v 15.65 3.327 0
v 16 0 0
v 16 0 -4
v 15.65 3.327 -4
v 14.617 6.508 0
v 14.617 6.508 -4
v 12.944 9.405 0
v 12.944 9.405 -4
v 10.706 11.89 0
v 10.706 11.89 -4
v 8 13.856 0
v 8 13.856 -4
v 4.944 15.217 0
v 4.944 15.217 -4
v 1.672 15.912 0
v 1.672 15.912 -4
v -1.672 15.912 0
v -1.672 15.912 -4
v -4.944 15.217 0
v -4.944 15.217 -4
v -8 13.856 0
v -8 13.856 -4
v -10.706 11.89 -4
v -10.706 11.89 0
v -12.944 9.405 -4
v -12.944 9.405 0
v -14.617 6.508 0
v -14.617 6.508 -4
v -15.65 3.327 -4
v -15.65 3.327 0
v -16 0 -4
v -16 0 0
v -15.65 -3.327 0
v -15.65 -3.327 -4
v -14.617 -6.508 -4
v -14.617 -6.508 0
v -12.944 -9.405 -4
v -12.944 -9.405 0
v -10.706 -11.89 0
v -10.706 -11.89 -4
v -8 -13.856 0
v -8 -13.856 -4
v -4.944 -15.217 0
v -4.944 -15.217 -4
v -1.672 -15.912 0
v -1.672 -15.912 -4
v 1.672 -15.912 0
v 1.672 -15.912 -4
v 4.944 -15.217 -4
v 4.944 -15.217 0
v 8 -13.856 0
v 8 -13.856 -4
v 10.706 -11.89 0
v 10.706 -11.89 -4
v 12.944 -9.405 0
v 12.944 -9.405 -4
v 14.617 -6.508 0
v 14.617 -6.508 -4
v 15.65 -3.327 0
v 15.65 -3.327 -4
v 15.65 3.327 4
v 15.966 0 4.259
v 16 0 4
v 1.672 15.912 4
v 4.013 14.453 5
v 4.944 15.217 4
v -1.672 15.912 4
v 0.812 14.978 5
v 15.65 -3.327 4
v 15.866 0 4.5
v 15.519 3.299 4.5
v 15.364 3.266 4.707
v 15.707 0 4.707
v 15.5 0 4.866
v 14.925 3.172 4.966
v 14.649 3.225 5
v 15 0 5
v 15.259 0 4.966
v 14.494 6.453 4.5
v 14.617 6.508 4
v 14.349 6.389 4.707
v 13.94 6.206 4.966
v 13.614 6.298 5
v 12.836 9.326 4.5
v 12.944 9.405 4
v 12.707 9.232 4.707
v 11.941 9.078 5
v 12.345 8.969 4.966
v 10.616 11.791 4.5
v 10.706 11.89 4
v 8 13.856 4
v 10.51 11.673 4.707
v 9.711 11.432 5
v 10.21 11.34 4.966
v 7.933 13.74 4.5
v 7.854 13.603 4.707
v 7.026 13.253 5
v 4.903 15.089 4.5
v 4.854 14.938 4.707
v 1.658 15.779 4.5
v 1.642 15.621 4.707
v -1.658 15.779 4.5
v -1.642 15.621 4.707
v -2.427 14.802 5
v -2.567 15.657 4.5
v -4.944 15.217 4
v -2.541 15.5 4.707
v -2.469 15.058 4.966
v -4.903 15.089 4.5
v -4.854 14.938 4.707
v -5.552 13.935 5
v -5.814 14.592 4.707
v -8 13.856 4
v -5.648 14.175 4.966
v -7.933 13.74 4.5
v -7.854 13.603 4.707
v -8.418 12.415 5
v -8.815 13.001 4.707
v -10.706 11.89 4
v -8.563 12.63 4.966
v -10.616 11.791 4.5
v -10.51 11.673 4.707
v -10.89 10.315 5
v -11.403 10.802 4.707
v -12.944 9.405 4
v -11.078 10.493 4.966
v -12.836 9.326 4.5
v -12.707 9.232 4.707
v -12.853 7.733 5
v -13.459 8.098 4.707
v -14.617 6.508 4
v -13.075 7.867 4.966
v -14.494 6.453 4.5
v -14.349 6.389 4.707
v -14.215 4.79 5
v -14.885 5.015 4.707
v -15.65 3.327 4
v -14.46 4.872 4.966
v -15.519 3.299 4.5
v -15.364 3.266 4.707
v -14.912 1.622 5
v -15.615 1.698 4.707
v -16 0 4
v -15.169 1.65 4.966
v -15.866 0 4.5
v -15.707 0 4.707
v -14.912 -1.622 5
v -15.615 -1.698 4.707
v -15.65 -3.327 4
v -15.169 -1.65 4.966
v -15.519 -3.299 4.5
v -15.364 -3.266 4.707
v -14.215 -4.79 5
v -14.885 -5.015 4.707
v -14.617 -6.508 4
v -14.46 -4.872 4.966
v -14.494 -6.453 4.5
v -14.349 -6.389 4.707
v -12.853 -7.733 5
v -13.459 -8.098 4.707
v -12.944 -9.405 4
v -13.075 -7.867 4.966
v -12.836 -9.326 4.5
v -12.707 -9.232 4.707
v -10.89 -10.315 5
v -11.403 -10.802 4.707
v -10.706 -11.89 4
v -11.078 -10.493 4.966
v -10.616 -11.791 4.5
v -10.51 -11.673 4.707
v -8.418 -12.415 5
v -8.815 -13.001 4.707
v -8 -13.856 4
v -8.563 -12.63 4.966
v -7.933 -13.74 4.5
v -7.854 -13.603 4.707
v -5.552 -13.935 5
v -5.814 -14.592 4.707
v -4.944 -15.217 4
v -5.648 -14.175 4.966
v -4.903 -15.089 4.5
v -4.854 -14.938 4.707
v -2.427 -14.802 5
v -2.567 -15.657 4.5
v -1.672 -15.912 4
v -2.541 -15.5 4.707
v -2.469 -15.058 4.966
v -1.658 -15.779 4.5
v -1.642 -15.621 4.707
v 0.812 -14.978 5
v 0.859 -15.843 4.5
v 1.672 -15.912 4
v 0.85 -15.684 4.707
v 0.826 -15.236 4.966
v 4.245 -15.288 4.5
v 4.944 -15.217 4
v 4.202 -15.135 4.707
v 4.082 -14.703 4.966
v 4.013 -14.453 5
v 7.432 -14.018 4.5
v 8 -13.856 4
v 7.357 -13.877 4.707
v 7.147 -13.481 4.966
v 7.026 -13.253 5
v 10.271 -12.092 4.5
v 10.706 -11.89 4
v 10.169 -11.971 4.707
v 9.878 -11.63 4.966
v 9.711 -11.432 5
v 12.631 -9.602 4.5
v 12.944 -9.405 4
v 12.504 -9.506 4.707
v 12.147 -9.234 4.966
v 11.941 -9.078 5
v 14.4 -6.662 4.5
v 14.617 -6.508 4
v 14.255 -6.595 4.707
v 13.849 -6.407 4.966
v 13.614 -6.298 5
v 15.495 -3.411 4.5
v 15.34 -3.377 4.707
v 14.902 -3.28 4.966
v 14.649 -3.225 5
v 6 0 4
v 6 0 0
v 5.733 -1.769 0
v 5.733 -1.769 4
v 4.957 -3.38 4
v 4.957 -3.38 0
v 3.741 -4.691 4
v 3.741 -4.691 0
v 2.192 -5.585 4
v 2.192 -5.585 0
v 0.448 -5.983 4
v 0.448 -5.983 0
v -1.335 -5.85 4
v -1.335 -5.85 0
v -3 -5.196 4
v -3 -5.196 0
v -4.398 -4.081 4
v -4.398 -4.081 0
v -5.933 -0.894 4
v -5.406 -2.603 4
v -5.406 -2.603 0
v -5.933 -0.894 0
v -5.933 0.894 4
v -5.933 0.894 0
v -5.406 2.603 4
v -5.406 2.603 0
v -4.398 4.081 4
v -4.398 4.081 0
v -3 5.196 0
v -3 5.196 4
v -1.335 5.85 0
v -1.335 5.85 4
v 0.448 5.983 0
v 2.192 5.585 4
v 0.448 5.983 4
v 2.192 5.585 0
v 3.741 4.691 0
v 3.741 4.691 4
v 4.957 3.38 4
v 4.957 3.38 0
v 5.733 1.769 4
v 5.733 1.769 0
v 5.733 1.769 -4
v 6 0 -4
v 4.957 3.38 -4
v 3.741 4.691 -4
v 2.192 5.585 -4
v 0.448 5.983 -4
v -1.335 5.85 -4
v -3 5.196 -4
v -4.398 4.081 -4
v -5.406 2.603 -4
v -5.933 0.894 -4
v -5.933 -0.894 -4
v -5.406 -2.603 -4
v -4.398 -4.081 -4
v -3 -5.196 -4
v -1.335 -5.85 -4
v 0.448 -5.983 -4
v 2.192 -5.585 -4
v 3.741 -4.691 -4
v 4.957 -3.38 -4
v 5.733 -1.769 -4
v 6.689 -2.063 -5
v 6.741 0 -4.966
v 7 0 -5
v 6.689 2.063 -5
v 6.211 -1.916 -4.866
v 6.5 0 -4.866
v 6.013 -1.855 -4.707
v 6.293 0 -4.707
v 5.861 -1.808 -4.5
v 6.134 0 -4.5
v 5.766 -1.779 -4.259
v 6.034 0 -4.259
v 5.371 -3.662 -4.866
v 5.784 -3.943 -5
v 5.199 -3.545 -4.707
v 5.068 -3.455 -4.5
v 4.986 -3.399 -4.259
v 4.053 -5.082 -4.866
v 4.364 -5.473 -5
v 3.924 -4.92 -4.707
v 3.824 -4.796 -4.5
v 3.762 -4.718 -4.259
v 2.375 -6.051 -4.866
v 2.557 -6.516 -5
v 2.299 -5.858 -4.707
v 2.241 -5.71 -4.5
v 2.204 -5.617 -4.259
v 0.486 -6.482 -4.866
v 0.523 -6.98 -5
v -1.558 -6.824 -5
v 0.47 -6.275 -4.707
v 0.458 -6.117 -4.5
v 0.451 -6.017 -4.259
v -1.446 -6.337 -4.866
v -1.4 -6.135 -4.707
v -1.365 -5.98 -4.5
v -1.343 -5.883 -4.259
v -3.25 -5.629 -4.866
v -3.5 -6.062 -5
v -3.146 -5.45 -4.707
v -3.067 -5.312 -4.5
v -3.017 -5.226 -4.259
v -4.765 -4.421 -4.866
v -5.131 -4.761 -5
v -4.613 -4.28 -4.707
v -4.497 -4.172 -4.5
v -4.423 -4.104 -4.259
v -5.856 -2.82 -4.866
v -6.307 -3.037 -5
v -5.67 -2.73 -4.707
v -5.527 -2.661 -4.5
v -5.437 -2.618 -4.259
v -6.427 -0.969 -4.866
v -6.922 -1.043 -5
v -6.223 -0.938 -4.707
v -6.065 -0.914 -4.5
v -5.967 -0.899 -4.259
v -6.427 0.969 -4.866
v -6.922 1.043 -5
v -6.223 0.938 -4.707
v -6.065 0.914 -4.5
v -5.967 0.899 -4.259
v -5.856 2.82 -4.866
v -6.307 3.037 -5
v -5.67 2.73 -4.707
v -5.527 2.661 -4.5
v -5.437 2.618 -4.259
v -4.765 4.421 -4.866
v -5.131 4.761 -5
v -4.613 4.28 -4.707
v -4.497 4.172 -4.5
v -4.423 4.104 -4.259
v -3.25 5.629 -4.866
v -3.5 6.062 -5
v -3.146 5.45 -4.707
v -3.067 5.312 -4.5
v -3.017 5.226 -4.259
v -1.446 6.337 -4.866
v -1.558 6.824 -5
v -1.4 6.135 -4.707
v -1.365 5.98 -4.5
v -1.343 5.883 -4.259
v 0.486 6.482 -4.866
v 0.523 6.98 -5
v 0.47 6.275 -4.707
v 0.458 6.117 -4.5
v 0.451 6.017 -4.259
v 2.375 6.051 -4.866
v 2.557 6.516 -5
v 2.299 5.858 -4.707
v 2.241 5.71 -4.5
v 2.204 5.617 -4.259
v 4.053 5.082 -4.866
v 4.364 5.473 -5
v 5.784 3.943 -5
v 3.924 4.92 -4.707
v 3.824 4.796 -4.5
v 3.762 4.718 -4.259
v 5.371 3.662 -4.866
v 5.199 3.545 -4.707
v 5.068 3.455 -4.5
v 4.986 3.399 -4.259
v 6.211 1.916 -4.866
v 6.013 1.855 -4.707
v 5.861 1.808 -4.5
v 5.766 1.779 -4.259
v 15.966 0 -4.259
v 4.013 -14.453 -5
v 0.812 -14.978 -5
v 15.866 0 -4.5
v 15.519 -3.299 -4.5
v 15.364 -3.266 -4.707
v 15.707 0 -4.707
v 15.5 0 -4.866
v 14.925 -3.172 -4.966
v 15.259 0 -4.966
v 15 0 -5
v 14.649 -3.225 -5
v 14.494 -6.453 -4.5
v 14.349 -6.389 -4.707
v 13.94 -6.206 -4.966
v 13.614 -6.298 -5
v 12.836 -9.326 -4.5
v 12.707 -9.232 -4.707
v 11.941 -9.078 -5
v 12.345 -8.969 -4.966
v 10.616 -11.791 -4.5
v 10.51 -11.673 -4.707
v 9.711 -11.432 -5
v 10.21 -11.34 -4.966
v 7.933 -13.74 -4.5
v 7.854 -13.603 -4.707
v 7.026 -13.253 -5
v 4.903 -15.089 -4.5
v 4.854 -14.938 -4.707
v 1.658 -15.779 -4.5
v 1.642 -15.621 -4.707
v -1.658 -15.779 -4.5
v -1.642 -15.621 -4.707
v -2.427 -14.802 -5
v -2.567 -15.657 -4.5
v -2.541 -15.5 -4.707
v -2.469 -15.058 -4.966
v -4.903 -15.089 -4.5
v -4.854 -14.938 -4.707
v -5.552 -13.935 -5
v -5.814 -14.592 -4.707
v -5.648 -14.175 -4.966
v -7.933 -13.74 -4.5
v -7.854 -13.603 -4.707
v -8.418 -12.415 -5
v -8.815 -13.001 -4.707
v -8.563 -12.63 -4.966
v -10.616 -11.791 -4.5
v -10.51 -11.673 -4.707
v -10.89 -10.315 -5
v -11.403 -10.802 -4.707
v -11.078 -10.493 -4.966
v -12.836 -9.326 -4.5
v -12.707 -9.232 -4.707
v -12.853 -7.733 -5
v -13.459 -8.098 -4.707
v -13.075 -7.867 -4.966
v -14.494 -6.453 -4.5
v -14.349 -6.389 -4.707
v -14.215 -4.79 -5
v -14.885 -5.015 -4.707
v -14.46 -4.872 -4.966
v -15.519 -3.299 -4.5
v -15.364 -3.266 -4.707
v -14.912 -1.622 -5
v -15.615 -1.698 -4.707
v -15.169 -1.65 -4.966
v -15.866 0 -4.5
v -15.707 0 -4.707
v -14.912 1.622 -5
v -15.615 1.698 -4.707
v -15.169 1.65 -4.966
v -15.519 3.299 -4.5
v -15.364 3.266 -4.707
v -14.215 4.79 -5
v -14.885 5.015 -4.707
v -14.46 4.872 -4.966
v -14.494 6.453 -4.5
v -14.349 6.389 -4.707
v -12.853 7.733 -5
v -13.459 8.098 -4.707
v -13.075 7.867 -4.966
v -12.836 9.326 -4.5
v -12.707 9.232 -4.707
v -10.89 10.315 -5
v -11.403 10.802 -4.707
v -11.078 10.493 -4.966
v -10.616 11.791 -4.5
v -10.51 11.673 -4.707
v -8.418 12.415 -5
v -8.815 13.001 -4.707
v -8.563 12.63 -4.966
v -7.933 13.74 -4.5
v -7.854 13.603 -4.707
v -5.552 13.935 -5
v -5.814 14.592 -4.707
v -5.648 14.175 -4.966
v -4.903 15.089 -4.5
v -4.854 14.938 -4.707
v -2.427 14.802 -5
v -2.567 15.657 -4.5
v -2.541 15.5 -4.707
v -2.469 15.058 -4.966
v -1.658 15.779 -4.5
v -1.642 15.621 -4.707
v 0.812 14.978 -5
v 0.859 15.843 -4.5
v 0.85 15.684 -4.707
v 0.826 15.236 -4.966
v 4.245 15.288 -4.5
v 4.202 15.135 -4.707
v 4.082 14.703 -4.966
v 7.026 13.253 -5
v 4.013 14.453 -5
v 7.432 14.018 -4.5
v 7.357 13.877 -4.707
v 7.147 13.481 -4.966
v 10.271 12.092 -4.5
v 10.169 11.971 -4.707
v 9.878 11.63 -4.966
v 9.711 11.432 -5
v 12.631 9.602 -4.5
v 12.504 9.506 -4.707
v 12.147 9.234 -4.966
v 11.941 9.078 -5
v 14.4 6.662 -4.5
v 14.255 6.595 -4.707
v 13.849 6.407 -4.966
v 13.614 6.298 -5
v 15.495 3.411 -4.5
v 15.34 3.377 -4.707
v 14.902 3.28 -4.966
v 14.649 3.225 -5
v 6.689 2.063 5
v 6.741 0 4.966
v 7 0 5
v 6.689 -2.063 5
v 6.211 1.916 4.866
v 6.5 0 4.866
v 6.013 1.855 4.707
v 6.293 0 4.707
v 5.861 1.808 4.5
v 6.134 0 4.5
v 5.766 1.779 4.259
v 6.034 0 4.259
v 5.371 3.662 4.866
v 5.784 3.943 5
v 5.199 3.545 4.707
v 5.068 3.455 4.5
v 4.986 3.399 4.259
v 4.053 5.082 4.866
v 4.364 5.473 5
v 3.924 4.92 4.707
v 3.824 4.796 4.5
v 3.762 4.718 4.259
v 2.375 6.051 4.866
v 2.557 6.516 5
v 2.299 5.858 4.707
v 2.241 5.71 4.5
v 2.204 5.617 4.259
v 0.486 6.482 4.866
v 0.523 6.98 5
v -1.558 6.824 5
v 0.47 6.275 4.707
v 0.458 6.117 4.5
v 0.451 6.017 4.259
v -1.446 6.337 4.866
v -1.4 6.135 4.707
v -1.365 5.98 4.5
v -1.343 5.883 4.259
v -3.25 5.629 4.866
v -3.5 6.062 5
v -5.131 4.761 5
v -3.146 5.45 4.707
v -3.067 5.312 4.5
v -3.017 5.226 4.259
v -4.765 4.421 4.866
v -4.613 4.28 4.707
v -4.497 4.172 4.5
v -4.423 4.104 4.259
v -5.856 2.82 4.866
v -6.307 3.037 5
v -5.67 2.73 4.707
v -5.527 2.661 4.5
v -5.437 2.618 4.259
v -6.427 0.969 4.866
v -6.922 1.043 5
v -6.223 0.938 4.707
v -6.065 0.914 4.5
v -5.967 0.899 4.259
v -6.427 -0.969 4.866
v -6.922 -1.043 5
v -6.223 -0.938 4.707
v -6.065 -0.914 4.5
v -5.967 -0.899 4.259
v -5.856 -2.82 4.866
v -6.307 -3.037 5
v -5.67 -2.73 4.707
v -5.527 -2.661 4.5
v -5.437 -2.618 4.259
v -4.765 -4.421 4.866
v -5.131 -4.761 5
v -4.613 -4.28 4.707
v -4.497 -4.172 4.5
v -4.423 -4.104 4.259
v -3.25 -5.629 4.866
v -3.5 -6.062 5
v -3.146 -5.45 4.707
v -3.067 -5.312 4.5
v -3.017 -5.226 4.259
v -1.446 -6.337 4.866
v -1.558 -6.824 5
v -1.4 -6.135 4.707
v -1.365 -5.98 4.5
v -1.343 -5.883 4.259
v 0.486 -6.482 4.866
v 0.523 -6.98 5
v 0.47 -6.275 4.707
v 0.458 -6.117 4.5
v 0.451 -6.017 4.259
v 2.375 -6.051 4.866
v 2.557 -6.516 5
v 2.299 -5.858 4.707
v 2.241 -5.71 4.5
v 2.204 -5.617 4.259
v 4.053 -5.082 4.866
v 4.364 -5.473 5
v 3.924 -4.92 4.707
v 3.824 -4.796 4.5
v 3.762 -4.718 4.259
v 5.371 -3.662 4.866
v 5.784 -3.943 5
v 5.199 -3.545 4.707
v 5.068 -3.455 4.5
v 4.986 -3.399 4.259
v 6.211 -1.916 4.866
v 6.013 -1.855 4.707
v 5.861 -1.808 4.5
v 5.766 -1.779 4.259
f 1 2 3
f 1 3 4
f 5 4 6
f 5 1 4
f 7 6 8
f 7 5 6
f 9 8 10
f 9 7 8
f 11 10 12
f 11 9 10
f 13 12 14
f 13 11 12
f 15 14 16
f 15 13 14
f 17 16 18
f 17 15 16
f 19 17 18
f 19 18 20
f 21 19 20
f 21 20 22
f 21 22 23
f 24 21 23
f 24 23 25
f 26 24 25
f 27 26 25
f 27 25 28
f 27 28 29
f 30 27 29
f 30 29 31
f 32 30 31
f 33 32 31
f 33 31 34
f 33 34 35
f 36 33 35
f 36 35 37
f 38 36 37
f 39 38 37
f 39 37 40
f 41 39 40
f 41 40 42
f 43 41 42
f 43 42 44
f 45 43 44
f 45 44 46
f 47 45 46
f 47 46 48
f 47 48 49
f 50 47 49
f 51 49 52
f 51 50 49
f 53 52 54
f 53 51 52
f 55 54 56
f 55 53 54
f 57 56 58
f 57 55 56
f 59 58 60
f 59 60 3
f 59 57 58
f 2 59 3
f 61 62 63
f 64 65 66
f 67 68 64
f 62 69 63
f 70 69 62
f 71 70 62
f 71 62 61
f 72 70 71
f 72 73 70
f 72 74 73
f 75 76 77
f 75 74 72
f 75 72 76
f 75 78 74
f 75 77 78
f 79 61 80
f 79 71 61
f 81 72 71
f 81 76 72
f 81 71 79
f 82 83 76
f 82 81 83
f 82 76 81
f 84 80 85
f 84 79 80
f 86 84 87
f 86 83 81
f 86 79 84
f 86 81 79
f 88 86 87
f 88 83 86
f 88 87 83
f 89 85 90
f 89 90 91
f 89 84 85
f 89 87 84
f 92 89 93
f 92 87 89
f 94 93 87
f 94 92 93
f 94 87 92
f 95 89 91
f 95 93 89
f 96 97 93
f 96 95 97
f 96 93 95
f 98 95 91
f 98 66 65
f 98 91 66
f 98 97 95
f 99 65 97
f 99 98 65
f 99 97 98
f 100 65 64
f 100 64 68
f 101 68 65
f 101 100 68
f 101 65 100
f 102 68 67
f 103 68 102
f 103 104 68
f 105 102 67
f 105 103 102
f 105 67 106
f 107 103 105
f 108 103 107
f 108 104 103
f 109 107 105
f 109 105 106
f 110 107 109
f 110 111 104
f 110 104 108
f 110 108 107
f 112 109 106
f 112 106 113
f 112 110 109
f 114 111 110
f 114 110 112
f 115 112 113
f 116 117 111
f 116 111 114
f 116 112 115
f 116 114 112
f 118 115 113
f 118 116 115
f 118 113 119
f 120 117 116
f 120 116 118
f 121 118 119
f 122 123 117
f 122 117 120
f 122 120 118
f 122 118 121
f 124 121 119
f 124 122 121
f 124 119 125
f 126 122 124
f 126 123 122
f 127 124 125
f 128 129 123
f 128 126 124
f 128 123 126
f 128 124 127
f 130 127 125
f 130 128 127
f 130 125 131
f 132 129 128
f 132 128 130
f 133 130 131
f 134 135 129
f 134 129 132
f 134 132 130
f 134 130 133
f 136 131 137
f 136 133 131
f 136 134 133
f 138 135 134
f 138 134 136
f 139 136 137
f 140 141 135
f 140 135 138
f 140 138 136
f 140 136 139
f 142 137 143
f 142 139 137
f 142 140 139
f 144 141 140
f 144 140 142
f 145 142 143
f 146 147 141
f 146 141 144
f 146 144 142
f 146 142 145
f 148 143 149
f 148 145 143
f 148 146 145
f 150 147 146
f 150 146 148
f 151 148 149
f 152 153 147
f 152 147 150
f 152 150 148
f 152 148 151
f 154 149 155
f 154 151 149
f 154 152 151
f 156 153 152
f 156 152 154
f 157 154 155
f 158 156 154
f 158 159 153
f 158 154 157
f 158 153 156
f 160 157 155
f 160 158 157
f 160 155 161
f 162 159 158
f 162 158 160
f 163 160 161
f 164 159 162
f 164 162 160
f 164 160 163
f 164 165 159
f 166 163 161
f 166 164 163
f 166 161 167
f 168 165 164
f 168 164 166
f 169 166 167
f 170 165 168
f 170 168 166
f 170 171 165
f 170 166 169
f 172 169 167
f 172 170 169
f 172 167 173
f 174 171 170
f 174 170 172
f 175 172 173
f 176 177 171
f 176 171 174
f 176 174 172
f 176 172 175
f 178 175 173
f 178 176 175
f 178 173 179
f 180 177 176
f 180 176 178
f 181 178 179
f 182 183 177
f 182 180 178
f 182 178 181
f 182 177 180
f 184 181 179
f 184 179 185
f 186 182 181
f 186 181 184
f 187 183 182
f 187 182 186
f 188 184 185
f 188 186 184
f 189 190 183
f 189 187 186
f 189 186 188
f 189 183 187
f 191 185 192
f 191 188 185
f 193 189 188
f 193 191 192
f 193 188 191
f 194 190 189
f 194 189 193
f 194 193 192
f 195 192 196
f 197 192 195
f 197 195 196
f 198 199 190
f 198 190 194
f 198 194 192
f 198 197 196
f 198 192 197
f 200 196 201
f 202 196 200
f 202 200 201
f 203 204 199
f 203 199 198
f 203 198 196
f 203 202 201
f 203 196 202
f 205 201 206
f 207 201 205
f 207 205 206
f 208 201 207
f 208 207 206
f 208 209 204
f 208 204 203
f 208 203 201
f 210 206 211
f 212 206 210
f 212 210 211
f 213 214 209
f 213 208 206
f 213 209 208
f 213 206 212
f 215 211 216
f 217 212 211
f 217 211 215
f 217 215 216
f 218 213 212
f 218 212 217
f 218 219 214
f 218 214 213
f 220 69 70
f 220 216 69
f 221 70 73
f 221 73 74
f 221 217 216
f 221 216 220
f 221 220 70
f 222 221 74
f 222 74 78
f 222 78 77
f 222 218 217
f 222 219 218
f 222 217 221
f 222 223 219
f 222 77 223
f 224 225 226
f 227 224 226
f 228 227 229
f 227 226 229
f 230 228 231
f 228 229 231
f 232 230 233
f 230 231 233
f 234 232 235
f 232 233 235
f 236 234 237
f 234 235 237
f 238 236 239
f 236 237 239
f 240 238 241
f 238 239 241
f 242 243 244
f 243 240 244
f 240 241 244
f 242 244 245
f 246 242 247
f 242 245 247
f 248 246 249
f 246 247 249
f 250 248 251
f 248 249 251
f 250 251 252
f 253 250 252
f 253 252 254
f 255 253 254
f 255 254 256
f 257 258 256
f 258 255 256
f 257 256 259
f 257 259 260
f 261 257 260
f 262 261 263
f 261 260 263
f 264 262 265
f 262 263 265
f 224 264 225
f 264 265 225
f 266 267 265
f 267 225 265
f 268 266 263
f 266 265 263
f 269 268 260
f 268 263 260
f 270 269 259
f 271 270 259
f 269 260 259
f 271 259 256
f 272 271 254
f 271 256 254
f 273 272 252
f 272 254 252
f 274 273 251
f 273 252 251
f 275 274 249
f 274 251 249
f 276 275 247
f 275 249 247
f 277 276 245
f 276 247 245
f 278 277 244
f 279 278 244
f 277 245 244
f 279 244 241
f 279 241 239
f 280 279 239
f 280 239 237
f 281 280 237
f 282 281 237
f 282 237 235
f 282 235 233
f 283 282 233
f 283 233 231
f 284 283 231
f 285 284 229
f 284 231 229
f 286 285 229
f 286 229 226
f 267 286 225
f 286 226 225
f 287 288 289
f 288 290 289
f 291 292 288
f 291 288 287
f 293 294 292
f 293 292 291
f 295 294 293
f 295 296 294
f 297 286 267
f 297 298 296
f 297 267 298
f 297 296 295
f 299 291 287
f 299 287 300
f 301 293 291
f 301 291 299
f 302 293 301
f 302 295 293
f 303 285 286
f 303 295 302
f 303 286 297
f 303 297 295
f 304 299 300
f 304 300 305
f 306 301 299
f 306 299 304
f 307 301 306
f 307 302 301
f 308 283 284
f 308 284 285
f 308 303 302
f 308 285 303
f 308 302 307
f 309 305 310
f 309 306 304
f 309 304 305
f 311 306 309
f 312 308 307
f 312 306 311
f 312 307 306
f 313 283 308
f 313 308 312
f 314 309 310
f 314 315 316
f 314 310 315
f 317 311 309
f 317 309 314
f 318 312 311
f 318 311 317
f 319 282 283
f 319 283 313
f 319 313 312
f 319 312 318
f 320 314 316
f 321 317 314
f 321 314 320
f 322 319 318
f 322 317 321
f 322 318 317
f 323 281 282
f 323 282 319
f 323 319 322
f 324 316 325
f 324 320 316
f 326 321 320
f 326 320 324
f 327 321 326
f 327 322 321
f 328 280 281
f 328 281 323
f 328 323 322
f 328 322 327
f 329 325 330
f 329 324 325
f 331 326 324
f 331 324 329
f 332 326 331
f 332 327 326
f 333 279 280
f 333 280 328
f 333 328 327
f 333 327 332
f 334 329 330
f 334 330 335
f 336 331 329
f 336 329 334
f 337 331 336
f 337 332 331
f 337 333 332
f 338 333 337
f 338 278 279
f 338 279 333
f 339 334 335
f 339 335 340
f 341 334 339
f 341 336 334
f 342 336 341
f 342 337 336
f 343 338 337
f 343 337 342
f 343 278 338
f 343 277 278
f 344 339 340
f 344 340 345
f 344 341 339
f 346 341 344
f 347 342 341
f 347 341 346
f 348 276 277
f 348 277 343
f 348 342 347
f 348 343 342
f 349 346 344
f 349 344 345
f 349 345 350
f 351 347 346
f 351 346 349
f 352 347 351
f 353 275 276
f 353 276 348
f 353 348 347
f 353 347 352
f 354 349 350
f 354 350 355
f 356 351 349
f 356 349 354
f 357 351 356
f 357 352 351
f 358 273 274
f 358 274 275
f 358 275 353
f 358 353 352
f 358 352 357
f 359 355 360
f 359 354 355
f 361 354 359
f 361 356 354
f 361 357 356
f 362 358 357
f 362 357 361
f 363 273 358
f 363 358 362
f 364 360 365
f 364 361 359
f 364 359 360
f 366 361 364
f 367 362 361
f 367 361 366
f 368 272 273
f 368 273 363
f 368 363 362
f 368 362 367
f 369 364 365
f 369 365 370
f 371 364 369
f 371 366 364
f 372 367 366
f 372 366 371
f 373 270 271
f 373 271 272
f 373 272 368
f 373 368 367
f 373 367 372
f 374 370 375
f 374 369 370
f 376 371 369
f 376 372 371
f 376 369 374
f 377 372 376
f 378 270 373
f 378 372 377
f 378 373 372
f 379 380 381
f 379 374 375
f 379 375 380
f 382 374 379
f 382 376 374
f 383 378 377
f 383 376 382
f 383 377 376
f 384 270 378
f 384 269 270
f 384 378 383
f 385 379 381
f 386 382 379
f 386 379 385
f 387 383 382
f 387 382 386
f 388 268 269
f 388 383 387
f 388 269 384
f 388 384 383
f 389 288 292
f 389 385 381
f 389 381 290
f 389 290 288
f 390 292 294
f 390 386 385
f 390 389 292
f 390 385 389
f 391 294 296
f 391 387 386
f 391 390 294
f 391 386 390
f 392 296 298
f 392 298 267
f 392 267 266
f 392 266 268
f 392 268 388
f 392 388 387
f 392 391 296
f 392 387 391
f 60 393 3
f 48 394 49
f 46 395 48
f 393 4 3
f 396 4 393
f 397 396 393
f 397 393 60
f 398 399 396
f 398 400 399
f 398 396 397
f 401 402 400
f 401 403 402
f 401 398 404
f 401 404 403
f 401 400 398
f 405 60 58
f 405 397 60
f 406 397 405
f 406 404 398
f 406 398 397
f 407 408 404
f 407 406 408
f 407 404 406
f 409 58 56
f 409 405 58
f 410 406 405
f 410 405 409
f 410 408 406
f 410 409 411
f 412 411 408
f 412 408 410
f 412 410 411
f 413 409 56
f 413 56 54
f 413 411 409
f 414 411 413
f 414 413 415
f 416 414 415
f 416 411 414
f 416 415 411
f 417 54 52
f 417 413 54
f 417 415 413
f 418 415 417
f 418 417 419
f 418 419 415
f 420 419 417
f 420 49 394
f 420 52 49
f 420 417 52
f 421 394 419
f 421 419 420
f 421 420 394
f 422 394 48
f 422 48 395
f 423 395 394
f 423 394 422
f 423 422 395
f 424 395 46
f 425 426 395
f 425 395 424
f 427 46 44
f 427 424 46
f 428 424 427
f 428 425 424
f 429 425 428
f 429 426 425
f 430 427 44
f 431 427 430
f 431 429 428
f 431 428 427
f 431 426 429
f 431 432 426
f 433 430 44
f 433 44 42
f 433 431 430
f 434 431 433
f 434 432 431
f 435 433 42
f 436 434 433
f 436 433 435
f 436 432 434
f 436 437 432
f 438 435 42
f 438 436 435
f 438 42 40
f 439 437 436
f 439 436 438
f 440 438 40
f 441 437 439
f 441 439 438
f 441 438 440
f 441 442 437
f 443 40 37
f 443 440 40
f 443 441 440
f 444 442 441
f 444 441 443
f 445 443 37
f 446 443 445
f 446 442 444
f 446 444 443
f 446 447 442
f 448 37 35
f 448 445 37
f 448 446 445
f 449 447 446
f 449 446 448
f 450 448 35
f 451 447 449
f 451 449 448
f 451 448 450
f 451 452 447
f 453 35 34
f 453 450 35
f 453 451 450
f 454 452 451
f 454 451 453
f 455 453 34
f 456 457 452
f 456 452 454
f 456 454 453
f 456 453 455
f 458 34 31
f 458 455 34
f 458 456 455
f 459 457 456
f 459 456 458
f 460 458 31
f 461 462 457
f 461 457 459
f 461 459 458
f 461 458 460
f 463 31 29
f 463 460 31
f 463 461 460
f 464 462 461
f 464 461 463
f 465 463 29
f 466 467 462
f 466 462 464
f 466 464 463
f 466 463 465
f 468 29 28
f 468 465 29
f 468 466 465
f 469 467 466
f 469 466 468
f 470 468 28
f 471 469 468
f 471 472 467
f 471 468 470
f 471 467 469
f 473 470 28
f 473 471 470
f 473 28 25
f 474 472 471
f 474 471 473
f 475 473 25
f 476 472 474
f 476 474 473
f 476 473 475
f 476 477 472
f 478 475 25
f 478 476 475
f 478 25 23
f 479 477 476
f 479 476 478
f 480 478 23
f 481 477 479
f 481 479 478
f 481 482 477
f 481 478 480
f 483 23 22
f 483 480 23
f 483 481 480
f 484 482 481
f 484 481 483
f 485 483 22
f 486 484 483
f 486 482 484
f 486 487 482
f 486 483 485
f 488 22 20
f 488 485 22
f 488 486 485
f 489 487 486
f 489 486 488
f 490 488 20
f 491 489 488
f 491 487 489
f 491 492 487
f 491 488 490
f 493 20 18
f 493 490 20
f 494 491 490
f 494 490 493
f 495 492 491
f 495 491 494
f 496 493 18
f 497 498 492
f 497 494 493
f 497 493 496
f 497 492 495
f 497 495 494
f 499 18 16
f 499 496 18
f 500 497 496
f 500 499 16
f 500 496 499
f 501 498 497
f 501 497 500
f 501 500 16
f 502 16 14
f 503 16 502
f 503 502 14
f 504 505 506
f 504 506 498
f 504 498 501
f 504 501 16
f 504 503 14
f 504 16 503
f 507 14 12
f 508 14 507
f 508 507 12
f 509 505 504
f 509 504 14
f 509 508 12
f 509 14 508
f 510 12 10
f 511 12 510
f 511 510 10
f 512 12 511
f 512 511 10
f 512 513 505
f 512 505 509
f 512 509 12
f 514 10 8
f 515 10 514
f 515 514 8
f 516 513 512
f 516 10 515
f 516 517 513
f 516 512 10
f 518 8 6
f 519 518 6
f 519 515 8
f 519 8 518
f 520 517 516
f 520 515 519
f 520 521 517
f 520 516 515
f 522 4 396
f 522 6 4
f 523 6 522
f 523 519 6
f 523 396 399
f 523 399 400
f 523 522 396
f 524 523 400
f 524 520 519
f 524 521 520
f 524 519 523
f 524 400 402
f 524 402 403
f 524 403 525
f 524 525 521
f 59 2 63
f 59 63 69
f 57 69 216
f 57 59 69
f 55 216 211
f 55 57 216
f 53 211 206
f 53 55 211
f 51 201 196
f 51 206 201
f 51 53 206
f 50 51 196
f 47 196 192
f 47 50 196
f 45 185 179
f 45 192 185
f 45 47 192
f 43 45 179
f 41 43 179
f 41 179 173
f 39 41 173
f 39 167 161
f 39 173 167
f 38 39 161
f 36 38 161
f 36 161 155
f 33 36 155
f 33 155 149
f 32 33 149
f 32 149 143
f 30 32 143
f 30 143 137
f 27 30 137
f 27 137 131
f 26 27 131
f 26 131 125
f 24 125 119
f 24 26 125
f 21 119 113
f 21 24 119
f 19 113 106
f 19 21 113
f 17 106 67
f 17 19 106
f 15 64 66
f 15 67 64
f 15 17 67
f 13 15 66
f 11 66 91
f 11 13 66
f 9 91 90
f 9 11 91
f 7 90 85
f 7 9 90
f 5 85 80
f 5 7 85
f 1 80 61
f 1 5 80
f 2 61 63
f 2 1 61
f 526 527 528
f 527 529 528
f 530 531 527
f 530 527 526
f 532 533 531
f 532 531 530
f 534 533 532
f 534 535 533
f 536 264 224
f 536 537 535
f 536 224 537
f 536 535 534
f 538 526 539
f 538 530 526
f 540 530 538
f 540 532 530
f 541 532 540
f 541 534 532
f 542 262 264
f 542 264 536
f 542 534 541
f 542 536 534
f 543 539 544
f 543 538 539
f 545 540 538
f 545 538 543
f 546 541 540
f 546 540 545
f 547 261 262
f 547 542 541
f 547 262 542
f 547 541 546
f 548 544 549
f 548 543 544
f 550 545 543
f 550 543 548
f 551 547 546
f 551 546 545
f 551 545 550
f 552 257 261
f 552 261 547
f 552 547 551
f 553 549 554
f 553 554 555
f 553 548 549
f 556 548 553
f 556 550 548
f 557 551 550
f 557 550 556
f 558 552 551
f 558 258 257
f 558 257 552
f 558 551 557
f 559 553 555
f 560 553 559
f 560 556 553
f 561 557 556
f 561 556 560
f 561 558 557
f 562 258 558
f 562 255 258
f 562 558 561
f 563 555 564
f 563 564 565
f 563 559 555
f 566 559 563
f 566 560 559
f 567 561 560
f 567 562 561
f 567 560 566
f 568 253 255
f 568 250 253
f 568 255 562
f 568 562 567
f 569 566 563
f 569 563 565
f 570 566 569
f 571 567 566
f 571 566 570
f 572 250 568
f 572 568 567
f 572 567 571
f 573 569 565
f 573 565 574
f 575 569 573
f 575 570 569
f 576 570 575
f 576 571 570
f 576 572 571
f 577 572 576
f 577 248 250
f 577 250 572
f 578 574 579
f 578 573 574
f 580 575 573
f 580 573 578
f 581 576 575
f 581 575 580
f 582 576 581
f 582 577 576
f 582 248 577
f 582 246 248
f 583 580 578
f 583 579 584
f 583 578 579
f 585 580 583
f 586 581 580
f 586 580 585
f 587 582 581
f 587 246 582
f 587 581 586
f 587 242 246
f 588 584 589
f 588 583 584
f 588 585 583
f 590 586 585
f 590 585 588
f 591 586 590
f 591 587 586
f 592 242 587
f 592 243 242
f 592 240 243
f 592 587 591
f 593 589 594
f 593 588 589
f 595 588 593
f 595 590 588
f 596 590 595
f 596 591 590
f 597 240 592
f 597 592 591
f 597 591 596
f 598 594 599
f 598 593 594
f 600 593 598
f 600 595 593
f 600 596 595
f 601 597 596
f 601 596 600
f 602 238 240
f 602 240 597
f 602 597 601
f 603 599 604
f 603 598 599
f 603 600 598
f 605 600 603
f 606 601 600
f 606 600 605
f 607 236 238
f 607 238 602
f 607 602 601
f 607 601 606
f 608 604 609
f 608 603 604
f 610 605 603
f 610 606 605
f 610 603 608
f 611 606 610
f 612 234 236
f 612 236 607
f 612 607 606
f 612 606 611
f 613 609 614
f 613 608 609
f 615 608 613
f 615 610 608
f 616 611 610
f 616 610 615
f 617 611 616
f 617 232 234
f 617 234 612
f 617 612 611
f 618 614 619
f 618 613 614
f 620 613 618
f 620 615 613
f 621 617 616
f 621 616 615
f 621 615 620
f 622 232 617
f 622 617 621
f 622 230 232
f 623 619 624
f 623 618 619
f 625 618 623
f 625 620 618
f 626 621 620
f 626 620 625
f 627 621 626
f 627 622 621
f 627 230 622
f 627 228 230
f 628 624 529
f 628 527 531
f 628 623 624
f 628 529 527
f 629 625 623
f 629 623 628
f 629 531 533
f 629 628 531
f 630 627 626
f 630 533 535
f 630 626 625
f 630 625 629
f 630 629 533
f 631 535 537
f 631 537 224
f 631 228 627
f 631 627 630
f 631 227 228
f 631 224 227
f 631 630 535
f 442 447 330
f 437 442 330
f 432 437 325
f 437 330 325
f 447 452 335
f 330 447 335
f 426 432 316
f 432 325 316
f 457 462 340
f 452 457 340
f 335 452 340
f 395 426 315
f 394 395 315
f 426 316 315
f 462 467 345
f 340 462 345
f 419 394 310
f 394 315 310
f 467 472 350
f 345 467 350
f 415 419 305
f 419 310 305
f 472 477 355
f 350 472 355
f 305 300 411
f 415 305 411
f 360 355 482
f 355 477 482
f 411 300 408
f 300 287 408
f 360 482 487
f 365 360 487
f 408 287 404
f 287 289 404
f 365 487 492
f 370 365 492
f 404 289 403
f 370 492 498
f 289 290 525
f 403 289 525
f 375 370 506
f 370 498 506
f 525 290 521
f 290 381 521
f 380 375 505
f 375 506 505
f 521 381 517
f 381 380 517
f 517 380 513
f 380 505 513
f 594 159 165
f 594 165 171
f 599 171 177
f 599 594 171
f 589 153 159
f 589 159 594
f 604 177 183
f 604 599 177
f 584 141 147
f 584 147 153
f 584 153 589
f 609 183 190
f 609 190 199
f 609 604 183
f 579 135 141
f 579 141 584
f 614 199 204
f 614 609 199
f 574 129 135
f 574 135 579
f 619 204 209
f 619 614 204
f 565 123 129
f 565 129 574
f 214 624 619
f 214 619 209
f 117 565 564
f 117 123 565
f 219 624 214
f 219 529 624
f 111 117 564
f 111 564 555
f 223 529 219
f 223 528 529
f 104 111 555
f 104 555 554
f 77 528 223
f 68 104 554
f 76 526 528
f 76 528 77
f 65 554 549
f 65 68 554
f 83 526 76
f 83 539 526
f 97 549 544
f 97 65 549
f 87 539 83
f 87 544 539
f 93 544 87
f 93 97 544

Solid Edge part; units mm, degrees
sketch "Sketch1" plane through (0, 0, 0) normal (0, 0, 1) x (1, 0, 0)
  circle A0 centre (0, 0) radius 6
  circle A1 centre (0, 0) radius 16
  dimension "D1" = 12
  dimension "D2" = 32
extrude "Ajout_matière_1" add sketch "Sketch1" along normal mid plane 10
fillet "Congé_1" radius 1 4 edges at (-16, 0, 5) (-16, 0, -5) (-6, 0, 5) (-6, 0, -5)
properties material "Acier inoxydable"
